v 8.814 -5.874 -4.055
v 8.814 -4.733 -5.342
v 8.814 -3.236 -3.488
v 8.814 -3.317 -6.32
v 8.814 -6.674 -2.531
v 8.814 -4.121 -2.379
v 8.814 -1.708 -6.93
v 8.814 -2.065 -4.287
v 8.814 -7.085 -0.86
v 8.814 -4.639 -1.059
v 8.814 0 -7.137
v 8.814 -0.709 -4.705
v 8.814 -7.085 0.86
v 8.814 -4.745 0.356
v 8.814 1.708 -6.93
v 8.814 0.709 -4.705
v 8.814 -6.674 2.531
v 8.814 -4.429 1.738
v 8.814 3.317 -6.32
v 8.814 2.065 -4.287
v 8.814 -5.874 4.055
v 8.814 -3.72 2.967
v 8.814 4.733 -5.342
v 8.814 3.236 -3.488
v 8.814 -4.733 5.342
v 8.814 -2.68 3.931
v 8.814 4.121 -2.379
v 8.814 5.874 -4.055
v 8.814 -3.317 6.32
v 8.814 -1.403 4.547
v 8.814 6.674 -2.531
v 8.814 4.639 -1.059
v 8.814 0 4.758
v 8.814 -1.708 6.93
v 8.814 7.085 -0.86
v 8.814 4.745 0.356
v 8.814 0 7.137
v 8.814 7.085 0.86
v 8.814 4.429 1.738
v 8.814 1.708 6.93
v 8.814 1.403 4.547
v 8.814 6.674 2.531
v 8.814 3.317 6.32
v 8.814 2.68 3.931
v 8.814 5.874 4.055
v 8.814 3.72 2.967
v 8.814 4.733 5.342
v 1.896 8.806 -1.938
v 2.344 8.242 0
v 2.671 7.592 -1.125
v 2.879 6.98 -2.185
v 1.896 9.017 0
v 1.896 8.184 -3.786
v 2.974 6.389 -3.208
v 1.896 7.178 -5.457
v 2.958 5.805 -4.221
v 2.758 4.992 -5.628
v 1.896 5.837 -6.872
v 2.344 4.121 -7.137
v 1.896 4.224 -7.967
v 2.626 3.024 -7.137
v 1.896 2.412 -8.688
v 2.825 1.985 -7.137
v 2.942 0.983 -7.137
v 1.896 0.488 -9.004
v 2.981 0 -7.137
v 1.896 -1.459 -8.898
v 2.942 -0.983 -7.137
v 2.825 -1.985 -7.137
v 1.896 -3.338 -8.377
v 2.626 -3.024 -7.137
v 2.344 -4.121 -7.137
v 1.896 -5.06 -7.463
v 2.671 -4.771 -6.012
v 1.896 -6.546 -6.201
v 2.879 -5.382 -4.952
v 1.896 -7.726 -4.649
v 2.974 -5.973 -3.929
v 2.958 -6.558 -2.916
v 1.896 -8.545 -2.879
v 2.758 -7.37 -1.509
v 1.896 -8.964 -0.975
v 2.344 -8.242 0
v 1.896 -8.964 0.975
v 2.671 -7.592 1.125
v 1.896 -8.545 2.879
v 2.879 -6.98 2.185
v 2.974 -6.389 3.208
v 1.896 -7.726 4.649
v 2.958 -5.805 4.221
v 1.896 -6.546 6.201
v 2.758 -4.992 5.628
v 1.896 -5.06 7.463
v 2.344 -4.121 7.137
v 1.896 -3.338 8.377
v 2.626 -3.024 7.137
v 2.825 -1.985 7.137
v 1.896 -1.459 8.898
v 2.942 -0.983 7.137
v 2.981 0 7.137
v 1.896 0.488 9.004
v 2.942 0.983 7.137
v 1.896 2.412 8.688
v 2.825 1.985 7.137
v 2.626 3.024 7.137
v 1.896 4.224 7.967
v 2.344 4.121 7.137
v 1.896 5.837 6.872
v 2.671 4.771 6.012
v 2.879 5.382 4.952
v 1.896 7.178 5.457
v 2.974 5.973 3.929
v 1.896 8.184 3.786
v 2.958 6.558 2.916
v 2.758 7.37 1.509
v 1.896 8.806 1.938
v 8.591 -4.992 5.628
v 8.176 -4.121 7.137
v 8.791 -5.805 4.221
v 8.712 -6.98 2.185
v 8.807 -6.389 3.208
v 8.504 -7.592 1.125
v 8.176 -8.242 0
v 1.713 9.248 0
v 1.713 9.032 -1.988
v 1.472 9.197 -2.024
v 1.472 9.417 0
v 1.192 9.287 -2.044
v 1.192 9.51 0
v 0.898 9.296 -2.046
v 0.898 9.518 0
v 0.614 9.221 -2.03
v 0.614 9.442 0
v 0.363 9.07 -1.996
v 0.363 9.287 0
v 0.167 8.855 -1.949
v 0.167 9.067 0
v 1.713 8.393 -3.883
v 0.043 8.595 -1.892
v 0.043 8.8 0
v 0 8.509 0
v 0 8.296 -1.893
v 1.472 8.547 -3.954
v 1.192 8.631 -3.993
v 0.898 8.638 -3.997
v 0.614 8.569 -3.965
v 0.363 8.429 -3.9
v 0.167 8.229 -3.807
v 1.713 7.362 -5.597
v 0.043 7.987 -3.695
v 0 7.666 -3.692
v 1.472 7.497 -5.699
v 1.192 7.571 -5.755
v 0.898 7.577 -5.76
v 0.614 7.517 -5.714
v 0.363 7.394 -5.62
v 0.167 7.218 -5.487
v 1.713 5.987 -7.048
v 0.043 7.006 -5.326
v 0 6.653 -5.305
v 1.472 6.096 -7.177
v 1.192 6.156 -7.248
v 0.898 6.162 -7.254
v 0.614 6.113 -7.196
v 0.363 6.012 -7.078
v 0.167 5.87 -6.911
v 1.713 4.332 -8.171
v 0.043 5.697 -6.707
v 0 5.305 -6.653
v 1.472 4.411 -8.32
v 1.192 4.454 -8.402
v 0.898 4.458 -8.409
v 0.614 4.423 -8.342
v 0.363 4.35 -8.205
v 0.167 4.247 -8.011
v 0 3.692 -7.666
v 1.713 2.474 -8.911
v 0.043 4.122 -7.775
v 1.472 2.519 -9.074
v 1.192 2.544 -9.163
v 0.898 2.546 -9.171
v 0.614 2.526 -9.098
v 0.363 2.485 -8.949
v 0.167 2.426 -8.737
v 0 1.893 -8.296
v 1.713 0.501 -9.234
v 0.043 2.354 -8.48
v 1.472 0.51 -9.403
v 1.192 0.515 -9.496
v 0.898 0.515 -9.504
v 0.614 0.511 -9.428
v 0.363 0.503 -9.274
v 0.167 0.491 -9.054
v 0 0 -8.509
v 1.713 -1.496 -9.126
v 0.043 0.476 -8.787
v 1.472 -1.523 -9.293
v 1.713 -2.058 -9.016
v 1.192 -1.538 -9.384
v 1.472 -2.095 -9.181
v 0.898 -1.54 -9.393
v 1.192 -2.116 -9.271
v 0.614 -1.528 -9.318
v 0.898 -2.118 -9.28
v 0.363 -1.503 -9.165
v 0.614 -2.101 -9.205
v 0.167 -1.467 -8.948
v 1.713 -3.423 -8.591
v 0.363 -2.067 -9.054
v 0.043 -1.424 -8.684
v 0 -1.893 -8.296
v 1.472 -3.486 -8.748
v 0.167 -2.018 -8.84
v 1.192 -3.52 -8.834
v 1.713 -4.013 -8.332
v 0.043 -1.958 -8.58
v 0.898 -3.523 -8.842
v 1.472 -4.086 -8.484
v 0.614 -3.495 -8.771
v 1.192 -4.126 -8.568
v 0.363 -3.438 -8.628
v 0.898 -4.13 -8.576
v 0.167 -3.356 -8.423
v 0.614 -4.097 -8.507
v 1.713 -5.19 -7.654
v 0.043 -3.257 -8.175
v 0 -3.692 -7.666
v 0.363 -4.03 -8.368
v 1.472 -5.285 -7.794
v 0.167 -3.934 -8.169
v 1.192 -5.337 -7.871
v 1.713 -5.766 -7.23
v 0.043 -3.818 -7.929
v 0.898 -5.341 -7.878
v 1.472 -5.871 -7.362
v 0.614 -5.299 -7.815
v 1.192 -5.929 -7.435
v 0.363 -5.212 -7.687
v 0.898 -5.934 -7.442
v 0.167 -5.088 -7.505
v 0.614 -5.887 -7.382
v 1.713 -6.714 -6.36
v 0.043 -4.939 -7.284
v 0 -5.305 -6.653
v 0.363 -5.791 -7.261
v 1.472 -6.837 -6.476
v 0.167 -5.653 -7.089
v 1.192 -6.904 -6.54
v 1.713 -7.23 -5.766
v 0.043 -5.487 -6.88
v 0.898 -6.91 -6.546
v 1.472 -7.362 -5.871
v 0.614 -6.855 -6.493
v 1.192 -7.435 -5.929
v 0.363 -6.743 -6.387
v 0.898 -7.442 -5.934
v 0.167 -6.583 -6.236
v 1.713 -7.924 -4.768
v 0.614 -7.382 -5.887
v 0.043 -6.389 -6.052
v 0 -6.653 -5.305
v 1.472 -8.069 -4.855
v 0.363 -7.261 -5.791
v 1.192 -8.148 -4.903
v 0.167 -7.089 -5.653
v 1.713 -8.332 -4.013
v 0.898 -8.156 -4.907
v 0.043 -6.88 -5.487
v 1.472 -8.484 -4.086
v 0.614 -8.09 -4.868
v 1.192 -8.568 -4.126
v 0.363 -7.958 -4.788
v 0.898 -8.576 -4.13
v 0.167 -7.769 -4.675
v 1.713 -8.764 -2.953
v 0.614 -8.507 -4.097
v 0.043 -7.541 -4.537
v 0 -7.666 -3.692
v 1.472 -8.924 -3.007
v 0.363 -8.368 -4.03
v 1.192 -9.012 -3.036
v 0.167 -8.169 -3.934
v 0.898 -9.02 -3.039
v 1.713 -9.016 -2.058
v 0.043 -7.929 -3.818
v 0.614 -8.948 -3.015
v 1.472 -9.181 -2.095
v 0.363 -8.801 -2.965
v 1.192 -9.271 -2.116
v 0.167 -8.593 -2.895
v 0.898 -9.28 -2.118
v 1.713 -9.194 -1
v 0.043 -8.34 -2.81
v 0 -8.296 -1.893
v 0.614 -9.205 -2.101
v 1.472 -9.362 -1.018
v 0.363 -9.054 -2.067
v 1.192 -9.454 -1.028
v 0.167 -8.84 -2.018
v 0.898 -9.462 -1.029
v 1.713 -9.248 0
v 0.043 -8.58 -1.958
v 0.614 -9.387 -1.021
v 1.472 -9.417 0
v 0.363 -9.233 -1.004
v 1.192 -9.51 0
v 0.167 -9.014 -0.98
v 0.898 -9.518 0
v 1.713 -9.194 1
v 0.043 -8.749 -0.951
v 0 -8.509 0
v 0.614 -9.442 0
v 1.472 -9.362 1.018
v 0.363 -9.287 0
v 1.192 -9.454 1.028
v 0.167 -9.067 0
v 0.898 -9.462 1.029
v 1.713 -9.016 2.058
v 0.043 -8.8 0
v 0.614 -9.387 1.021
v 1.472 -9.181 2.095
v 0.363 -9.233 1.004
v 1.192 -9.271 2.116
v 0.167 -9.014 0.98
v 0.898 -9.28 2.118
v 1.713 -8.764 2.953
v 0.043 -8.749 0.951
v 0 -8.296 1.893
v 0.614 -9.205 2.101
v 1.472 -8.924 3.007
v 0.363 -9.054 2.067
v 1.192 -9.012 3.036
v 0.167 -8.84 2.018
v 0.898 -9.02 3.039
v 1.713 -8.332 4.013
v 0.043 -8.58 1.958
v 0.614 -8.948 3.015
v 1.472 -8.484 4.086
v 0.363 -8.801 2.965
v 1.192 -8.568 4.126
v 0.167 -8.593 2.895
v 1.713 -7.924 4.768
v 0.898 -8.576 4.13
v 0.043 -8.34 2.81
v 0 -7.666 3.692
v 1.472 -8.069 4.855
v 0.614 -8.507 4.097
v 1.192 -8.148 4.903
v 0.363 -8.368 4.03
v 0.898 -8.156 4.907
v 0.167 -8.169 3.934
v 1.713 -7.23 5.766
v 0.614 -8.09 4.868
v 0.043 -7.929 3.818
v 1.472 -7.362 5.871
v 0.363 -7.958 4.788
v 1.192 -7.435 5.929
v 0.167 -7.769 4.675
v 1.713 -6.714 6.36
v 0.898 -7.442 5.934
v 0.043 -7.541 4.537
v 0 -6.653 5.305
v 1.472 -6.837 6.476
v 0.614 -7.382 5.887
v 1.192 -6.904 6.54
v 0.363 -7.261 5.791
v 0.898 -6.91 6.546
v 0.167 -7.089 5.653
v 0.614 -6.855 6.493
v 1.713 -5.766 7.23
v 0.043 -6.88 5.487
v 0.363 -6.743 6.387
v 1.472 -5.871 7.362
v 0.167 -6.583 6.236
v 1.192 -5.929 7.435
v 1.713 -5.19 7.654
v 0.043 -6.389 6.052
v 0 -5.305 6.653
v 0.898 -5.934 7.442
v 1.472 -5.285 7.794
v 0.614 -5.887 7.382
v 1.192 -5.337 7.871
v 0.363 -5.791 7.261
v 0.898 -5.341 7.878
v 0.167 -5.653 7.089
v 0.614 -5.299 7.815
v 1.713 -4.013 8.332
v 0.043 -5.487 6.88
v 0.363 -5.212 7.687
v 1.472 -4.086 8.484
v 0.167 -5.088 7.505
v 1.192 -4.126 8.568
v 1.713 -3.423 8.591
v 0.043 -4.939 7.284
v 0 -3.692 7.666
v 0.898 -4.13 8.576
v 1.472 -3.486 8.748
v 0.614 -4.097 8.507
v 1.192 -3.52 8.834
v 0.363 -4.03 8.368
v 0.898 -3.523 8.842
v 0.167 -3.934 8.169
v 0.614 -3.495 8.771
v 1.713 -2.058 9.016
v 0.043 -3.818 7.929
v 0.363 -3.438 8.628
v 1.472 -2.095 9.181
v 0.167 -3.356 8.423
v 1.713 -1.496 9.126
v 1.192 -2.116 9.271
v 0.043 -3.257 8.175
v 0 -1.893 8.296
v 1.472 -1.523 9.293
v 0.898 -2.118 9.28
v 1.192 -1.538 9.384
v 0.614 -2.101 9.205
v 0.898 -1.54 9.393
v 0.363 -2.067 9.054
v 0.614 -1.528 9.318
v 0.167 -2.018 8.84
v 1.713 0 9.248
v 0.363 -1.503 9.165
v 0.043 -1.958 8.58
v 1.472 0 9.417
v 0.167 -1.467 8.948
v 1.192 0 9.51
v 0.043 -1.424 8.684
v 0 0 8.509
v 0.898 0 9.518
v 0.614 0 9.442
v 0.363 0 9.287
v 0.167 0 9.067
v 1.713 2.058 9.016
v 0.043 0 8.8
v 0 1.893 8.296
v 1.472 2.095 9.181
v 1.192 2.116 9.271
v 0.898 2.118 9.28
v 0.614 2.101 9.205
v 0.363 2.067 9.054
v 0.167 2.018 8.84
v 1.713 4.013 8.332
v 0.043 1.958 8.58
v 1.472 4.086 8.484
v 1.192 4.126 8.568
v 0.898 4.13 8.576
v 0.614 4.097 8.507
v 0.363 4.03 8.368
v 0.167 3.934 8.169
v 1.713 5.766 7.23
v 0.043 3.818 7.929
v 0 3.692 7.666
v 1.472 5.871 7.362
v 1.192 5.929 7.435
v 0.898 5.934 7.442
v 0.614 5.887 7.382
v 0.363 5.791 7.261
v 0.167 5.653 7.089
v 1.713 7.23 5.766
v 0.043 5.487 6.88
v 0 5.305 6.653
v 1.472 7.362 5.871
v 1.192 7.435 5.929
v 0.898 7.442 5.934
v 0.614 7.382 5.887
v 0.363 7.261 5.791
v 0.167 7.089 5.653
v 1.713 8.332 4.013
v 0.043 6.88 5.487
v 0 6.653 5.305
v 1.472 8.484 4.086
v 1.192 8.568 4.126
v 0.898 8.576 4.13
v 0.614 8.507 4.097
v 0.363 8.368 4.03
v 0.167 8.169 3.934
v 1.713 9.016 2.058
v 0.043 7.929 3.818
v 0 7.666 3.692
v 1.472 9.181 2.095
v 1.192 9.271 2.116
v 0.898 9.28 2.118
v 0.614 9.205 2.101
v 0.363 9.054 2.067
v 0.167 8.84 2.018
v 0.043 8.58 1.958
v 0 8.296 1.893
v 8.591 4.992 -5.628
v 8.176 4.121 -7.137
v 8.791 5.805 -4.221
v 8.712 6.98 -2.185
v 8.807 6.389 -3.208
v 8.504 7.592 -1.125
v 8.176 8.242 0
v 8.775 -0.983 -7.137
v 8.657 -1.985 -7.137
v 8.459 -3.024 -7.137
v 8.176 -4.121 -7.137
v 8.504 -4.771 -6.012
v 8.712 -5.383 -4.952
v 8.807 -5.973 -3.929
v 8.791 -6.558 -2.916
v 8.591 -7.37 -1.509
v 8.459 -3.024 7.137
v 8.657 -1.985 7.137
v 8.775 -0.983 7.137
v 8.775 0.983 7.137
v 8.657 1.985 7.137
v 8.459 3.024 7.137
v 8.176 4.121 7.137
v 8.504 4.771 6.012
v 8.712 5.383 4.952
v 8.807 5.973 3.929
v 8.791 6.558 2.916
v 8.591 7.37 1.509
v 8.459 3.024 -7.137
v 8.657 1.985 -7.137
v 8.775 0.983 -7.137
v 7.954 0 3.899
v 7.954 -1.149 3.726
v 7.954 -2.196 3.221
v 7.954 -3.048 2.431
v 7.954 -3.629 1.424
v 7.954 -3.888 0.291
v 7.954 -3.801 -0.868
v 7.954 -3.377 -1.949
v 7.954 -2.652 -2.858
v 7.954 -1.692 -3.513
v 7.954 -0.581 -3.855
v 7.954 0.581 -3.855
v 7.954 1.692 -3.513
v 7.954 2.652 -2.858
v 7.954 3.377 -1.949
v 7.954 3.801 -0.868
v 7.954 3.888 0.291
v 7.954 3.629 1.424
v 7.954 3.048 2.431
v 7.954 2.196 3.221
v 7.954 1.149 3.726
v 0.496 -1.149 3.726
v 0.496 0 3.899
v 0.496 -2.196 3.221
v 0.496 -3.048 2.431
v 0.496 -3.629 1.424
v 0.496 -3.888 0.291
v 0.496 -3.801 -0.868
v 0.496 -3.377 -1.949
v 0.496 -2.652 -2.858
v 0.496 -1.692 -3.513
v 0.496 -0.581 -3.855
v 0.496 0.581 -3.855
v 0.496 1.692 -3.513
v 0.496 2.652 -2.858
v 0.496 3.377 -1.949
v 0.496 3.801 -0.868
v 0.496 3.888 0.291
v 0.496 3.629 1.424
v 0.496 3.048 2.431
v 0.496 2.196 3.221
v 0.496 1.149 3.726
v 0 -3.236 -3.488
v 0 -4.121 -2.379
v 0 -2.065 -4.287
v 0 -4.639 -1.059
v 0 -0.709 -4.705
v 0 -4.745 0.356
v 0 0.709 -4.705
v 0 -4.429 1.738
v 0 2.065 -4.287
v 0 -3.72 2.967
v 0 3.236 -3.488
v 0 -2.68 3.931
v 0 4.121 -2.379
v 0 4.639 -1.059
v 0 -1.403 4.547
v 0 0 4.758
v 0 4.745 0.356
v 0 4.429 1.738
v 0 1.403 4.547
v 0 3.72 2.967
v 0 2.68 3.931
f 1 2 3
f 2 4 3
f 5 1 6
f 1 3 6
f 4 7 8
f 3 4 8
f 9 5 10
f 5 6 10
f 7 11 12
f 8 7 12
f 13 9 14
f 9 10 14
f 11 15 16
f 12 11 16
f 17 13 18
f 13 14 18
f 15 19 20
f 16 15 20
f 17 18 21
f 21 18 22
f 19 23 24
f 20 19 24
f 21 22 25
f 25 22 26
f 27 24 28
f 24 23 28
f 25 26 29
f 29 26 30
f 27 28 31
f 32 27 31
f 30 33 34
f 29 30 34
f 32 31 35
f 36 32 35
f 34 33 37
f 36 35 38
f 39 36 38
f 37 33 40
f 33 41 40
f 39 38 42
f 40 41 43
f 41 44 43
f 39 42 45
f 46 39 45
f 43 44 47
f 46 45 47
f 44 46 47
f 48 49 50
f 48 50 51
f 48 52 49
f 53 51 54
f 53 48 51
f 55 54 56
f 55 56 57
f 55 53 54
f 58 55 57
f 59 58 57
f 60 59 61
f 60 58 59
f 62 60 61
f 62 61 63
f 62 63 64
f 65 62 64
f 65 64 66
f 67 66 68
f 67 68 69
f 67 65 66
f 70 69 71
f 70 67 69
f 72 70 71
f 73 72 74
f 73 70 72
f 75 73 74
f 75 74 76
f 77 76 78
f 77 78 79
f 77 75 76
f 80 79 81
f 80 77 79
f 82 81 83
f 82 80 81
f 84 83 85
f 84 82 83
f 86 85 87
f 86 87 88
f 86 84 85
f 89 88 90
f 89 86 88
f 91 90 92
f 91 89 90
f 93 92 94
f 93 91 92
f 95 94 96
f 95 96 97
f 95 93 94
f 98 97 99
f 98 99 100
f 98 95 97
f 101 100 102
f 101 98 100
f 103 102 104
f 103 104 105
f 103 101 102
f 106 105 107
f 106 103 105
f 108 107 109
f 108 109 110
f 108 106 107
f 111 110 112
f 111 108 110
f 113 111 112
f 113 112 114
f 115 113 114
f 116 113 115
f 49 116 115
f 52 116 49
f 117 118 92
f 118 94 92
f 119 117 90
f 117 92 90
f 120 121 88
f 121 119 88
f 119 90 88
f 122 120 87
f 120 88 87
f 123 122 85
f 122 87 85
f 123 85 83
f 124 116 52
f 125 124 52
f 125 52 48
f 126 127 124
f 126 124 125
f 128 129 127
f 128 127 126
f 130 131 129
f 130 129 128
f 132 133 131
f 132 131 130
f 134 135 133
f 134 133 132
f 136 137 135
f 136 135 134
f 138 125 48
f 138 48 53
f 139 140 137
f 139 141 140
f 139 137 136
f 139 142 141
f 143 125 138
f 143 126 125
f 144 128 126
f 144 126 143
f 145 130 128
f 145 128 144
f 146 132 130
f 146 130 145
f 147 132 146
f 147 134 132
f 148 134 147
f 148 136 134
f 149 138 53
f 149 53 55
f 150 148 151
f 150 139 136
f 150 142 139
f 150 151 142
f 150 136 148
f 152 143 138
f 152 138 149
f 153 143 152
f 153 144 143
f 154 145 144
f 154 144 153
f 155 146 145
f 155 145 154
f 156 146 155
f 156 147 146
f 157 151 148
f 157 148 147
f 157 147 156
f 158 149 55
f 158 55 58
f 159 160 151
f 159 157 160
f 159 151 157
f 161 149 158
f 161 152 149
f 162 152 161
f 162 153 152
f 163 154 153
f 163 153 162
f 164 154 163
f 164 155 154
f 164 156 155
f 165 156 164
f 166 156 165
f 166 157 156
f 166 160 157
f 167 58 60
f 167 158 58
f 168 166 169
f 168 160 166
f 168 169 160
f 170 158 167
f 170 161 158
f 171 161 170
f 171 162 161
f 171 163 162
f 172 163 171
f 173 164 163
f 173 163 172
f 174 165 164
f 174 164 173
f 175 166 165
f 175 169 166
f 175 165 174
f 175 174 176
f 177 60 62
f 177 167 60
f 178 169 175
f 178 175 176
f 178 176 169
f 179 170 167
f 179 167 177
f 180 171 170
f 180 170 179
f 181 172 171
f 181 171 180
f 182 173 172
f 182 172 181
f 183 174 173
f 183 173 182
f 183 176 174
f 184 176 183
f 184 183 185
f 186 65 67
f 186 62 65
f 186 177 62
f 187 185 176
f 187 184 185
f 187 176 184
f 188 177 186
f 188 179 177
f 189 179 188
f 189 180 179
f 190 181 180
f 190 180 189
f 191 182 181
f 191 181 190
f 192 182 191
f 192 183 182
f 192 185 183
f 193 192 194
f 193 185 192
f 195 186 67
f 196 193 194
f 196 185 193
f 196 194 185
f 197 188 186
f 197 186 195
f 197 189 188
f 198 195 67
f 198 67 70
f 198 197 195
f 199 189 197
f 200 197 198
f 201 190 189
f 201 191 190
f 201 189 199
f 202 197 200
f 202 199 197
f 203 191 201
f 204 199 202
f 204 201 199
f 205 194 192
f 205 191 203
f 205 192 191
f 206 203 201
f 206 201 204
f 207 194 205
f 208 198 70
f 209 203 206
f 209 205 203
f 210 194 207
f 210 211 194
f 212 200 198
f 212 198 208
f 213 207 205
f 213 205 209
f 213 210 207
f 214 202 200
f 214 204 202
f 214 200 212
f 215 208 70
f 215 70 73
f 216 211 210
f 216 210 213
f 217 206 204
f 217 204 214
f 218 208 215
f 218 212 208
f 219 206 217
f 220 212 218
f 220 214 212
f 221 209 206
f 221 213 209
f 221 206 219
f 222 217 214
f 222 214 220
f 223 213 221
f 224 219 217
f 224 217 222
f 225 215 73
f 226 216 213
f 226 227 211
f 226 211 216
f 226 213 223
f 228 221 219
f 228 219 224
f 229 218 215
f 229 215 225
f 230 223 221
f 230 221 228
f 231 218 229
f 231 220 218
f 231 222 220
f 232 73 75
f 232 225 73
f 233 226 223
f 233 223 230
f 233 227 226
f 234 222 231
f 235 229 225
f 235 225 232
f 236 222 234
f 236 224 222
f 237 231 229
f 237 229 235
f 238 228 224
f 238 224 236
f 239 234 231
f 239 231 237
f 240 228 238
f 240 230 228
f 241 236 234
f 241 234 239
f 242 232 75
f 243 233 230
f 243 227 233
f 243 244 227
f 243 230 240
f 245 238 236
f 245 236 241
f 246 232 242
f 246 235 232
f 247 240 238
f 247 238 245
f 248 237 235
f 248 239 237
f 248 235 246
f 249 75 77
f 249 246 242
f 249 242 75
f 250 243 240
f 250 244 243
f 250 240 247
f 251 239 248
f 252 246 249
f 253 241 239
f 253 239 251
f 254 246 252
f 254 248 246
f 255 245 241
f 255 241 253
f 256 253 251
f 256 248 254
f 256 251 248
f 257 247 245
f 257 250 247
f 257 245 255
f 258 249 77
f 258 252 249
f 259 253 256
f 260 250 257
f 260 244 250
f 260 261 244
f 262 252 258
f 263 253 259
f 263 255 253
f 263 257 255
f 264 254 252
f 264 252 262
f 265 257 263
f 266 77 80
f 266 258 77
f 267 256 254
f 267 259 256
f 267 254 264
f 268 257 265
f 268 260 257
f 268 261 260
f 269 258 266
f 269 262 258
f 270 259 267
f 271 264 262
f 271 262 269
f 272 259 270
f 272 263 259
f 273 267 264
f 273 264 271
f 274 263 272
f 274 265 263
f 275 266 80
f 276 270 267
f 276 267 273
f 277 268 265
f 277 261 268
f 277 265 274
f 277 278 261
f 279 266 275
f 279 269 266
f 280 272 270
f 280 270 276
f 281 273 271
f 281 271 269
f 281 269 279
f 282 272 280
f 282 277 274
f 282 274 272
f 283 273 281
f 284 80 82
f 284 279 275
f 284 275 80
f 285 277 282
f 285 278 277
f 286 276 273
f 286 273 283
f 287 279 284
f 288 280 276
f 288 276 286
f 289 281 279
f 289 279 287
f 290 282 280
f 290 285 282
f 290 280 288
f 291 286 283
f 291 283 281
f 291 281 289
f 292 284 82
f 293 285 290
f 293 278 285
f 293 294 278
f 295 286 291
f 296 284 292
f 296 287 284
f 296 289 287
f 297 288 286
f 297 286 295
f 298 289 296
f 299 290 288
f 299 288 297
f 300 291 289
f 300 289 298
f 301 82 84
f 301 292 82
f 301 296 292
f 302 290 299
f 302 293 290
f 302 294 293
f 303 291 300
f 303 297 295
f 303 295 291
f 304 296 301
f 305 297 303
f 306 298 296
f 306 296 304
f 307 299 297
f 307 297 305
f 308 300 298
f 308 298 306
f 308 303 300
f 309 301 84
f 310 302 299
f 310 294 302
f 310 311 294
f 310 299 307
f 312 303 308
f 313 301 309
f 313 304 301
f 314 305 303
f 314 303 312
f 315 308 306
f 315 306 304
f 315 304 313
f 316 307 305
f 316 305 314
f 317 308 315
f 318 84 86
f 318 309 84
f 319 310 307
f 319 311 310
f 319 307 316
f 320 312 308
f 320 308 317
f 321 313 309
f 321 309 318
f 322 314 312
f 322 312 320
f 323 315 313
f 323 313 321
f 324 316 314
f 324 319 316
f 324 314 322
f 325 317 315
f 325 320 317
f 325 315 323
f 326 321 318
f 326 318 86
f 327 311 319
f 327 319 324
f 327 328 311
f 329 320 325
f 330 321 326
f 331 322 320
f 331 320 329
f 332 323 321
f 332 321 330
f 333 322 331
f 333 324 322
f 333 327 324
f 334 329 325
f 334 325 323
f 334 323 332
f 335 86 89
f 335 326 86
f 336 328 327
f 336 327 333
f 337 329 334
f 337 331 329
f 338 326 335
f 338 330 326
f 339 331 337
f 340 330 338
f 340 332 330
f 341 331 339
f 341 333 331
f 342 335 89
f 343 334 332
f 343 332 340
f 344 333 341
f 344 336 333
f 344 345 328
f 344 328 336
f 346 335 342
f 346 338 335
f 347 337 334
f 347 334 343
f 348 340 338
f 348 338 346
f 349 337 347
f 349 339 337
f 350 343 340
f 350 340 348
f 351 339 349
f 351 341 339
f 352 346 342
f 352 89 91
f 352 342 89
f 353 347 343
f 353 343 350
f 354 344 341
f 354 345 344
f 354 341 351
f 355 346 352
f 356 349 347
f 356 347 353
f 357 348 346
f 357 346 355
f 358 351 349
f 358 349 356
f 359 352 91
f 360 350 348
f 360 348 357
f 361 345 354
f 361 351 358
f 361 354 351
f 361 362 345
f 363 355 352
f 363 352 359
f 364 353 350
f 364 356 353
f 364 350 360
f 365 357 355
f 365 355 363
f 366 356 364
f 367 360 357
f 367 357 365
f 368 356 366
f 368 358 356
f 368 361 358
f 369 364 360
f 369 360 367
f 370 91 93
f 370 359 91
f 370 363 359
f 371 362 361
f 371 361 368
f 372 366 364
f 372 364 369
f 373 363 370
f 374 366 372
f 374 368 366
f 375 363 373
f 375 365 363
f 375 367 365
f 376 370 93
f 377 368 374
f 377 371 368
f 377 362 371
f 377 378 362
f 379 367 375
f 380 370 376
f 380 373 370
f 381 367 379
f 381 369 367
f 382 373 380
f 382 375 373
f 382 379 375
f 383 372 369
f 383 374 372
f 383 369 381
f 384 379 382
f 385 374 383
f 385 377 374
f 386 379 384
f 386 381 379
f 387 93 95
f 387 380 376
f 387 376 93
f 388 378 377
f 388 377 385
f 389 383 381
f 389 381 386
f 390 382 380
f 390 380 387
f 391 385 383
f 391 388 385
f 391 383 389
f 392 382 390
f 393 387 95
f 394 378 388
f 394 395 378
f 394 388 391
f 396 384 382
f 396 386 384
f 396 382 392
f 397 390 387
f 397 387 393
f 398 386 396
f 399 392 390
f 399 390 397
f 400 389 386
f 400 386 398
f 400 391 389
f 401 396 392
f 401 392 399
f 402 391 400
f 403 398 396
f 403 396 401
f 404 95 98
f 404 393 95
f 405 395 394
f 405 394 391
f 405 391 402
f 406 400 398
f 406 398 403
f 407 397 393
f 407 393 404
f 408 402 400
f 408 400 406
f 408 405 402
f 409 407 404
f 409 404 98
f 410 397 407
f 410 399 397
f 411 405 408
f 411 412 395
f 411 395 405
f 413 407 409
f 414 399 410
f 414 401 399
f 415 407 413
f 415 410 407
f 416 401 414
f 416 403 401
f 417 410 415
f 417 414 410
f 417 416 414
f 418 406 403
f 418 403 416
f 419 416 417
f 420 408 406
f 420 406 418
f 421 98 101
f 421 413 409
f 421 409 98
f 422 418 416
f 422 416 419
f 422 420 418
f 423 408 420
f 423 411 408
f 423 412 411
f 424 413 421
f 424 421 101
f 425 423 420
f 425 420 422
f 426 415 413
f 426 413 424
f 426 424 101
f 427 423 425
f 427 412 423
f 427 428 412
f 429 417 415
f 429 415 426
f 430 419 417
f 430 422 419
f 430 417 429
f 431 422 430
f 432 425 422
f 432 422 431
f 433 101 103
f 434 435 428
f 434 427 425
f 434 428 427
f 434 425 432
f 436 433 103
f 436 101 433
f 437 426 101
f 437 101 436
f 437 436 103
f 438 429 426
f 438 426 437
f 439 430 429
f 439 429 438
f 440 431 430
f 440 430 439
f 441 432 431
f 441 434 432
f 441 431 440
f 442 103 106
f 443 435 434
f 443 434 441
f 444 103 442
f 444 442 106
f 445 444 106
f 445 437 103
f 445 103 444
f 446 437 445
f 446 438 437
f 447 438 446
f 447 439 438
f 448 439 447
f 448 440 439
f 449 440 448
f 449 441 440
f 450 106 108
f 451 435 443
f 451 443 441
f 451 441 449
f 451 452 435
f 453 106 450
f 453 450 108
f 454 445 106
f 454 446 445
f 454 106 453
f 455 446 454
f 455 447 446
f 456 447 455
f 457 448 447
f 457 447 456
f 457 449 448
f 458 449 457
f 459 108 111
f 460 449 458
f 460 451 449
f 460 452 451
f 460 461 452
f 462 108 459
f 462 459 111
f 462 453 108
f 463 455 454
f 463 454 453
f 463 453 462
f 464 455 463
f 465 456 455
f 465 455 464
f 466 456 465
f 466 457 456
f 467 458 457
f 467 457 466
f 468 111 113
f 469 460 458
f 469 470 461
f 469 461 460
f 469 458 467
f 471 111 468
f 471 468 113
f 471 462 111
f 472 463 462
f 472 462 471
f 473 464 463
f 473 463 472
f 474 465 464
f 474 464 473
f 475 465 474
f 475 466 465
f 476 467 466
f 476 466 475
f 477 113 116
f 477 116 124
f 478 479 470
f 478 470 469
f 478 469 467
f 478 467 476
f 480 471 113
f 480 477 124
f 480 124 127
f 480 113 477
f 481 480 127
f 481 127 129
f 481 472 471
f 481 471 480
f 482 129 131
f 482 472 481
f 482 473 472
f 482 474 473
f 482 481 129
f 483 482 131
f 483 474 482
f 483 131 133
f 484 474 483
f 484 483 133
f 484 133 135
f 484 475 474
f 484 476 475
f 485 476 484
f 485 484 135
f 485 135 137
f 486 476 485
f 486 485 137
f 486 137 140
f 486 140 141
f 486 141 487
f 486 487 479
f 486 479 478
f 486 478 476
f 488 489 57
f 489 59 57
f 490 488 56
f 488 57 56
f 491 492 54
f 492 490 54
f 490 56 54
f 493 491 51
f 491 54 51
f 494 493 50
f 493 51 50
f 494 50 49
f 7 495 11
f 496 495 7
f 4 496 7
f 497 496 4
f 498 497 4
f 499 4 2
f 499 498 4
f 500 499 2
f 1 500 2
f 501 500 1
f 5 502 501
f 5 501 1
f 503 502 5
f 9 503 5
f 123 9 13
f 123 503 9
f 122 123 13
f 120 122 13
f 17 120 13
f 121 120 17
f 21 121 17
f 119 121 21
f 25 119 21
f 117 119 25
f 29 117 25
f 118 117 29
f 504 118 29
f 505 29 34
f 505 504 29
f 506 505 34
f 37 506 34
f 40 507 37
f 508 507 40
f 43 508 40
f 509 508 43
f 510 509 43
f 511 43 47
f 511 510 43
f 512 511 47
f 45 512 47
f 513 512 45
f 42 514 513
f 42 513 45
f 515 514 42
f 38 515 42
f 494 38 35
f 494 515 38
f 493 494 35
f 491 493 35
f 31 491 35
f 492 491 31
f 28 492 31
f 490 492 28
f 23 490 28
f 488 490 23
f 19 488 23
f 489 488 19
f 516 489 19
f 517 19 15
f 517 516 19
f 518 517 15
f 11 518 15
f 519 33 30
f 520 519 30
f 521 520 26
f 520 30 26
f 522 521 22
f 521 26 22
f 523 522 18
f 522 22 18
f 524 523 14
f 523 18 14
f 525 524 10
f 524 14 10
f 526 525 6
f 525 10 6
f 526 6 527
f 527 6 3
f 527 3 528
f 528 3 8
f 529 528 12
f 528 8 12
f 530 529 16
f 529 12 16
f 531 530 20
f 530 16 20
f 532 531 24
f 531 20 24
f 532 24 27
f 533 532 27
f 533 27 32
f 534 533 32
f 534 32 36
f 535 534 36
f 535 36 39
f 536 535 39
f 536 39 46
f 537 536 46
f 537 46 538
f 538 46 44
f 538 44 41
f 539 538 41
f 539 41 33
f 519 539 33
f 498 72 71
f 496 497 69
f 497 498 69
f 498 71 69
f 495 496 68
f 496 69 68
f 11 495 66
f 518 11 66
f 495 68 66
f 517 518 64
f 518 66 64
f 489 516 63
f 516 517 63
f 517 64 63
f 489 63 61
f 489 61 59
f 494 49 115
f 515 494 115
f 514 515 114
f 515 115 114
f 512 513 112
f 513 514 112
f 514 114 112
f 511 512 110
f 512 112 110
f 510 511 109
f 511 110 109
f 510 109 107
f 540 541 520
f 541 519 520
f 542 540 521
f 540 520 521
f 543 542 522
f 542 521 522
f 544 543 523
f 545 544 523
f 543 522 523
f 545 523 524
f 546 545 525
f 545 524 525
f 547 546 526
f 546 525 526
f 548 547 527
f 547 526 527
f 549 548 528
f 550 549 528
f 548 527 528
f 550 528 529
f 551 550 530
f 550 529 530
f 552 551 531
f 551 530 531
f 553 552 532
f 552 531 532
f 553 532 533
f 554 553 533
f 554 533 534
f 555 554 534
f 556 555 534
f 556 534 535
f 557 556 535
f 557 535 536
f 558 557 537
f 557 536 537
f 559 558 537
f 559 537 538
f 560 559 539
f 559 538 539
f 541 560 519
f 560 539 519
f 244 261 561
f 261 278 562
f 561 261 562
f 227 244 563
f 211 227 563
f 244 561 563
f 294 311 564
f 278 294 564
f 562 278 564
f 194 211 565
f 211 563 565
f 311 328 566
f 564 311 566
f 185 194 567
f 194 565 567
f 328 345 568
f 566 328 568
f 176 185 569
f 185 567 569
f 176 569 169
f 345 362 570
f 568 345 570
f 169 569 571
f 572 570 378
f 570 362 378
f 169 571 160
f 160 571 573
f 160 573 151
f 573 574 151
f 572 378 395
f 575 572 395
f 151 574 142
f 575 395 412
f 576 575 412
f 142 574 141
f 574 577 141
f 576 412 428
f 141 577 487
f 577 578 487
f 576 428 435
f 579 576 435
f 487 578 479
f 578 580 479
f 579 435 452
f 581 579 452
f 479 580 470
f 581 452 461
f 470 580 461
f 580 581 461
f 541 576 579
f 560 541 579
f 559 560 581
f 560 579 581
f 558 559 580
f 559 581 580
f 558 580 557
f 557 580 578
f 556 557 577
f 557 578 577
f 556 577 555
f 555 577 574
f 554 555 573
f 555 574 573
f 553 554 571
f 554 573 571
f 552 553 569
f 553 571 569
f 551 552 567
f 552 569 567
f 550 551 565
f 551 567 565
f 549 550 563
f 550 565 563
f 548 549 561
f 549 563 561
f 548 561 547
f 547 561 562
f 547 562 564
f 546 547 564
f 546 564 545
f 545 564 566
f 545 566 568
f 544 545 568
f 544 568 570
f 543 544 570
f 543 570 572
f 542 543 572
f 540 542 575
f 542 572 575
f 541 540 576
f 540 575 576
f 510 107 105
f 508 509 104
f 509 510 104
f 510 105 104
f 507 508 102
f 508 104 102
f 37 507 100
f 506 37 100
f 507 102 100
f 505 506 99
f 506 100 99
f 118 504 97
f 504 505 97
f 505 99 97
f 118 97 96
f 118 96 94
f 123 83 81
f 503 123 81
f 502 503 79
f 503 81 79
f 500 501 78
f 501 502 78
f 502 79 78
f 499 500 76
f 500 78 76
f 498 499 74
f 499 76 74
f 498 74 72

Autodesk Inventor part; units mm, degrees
ref_plane "YZ Plane" through (0, 0, 0) normal (1, 0, 0) x (0, 1, 0)
ref_plane "XZ Plane" through (0, 0, 0) normal (0, 1, 0) x (-1, 0, 0)
sketch "Sketch1" plane through (0, 0, 0) normal (0, 0, 1) x (1, 0, 0)
  line L0 (-1.9966, 0) -> (10.6155, 0) projected
  line L1 (2.9811, 7.1374) -> (1.8959, 9.017)
  line L2 (2.9811, 7.1374) -> (8.8138, 7.1374) construction
  line L3 (8.8138, 7.1374) -> (8.8138, 0) construction
  arc A0 (1.8959, 9.017) -> (0, 8.509) centre (1.016, 8.509) ccw
  line L4 (2.9811, 7.1374) -> (2.9811, 0)
  line L5 (0, -1.9489) -> (0, 11.6933) projected
  point P0 (0, 0)
  dimension "d2" = 14.2748
  dimension "d4" = 19.05
  dimension "d5" = 1.016
  dimension "d15" = 8.8138
  dimension "d16" = 30
revolve "Ring" add sketch "Sketch1" angle 360 about axis through (-10, 0, 0) along (1, 0, 0)
sketch "Sketch2" plane through (0, 0, 0) normal (-1, 0, 0) x (0, 0, 1)
  circle A0 centre (0, 0) radius 4.9
  line L0 (-7.1374, -4.1208) -> (-7.1374, 4.1208)
  line L1 (-7.1374, 4.1208) -> (0, 8.2416)
  line L2 (0, 8.2416) -> (7.1374, 4.1208)
  line L3 (7.1374, 4.1208) -> (7.1374, -4.1208)
  line L4 (7.1374, -4.1208) -> (0, -8.2416)
  line L5 (0, -8.2416) -> (-7.1374, -4.1208)
  circle A1 centre (0, 0) radius 8.509 projected
  dimension "d6" = 16.4831
extrude "Body" add sketch "Sketch2" against normal blind 8.8138 contours A0 | L0 L1 L2 L3 L4 L5
sketch "Sketch3" plane through (0, 0, 0) normal (0, 0, 1) x (1, 0, 0)
  line L0 (2.3436, 8.2416) -> (8.8138, 8.2416) projected
  line L1 (8.8138, 4.1208) -> (8.8138, 8.2416) projected
  line L2 (0, -8.509) -> (0, 8.509) projected
  line L3 (-1.7628, 0) -> (10.5766, 0) projected
  line L4 (8.1763, 8.2416) -> (8.8138, 7.1374)
  dimension "d10" = 30
  dimension "d11" = 14.2748
revolve "Chamfer1" cut sketch "Sketch3" angle 360 about axis through (-10, 0, 0) along (1, 0, 0)
sketch "Sketch4" plane through (0, 0, 0) normal (-1, 0, 0) x (0, 0, 1)
  circle A0 centre (0, 0) radius 8.509 projected
hole "Thread" at (0, 0, 0) direction (1, 0, 0) diameter 7.7978 end through all thread size "3/8-16 UNC" class "2B" standard "ANSI Unified Screw Threads"
chamfer "Chamfer2" distance 0.8593 angle 30 1 edges at (0, 0, -3.8989) measured on face at (0, 6.8804, -0.8354)
ref_plane "Work Plane1" through (28.3459, 0, 0) normal (0, 0, -1) x (-1, 0, 0)
chamfer "Chamfer3" distance 0.8593 angle 45 1 edges at (8.8138, 0, -3.8989)
equation "\"d6\" = 1.1547 * SW"
equation "\"d7\" = KOH"
equation "\"d12\" = -0.5 * GD1 + 0.5 * NND"
equation "\"d46\" = -0.5 * GD1 + 0.5 * NND"
equation "\"d51\" = -0.5 * GD1 + 0.5 * NND"
equation "\"d2\" = SW"
equation "\"d4\" = LADI"
equation "\"d5\" = PHH"
equation "\"d15\" = KOH"
equation "\"d16\" = KEWI"
equation "\"d10\" = ANG1"
equation "\"d11\" = SW0"
equation "\"ANG1\" = 30deg"
equation "\"KEWI\" = 30deg"
equation "\"NND\" = 9.525"
equation "\"LADI\" = 19.05"
equation "\"SW\" = 14.2748"
equation "\"PHH\" = 1.016"
equation "\"KOH\" = 8.8138"
equation "\"SW0\" = SW"
equation "\"d1\" = LADI"
equation "\"d3\" = PHH"
equation "\"THREADDIA\" = 9.525"
equation "\"TOA\" = 30deg"
equation "\"E0\" = 1.155 * SW"
equation "\"GD1\" = 7.806481"
properties part number "IFI - I0.375 - 16, HFNI(1)" material "Steel, Mild"
